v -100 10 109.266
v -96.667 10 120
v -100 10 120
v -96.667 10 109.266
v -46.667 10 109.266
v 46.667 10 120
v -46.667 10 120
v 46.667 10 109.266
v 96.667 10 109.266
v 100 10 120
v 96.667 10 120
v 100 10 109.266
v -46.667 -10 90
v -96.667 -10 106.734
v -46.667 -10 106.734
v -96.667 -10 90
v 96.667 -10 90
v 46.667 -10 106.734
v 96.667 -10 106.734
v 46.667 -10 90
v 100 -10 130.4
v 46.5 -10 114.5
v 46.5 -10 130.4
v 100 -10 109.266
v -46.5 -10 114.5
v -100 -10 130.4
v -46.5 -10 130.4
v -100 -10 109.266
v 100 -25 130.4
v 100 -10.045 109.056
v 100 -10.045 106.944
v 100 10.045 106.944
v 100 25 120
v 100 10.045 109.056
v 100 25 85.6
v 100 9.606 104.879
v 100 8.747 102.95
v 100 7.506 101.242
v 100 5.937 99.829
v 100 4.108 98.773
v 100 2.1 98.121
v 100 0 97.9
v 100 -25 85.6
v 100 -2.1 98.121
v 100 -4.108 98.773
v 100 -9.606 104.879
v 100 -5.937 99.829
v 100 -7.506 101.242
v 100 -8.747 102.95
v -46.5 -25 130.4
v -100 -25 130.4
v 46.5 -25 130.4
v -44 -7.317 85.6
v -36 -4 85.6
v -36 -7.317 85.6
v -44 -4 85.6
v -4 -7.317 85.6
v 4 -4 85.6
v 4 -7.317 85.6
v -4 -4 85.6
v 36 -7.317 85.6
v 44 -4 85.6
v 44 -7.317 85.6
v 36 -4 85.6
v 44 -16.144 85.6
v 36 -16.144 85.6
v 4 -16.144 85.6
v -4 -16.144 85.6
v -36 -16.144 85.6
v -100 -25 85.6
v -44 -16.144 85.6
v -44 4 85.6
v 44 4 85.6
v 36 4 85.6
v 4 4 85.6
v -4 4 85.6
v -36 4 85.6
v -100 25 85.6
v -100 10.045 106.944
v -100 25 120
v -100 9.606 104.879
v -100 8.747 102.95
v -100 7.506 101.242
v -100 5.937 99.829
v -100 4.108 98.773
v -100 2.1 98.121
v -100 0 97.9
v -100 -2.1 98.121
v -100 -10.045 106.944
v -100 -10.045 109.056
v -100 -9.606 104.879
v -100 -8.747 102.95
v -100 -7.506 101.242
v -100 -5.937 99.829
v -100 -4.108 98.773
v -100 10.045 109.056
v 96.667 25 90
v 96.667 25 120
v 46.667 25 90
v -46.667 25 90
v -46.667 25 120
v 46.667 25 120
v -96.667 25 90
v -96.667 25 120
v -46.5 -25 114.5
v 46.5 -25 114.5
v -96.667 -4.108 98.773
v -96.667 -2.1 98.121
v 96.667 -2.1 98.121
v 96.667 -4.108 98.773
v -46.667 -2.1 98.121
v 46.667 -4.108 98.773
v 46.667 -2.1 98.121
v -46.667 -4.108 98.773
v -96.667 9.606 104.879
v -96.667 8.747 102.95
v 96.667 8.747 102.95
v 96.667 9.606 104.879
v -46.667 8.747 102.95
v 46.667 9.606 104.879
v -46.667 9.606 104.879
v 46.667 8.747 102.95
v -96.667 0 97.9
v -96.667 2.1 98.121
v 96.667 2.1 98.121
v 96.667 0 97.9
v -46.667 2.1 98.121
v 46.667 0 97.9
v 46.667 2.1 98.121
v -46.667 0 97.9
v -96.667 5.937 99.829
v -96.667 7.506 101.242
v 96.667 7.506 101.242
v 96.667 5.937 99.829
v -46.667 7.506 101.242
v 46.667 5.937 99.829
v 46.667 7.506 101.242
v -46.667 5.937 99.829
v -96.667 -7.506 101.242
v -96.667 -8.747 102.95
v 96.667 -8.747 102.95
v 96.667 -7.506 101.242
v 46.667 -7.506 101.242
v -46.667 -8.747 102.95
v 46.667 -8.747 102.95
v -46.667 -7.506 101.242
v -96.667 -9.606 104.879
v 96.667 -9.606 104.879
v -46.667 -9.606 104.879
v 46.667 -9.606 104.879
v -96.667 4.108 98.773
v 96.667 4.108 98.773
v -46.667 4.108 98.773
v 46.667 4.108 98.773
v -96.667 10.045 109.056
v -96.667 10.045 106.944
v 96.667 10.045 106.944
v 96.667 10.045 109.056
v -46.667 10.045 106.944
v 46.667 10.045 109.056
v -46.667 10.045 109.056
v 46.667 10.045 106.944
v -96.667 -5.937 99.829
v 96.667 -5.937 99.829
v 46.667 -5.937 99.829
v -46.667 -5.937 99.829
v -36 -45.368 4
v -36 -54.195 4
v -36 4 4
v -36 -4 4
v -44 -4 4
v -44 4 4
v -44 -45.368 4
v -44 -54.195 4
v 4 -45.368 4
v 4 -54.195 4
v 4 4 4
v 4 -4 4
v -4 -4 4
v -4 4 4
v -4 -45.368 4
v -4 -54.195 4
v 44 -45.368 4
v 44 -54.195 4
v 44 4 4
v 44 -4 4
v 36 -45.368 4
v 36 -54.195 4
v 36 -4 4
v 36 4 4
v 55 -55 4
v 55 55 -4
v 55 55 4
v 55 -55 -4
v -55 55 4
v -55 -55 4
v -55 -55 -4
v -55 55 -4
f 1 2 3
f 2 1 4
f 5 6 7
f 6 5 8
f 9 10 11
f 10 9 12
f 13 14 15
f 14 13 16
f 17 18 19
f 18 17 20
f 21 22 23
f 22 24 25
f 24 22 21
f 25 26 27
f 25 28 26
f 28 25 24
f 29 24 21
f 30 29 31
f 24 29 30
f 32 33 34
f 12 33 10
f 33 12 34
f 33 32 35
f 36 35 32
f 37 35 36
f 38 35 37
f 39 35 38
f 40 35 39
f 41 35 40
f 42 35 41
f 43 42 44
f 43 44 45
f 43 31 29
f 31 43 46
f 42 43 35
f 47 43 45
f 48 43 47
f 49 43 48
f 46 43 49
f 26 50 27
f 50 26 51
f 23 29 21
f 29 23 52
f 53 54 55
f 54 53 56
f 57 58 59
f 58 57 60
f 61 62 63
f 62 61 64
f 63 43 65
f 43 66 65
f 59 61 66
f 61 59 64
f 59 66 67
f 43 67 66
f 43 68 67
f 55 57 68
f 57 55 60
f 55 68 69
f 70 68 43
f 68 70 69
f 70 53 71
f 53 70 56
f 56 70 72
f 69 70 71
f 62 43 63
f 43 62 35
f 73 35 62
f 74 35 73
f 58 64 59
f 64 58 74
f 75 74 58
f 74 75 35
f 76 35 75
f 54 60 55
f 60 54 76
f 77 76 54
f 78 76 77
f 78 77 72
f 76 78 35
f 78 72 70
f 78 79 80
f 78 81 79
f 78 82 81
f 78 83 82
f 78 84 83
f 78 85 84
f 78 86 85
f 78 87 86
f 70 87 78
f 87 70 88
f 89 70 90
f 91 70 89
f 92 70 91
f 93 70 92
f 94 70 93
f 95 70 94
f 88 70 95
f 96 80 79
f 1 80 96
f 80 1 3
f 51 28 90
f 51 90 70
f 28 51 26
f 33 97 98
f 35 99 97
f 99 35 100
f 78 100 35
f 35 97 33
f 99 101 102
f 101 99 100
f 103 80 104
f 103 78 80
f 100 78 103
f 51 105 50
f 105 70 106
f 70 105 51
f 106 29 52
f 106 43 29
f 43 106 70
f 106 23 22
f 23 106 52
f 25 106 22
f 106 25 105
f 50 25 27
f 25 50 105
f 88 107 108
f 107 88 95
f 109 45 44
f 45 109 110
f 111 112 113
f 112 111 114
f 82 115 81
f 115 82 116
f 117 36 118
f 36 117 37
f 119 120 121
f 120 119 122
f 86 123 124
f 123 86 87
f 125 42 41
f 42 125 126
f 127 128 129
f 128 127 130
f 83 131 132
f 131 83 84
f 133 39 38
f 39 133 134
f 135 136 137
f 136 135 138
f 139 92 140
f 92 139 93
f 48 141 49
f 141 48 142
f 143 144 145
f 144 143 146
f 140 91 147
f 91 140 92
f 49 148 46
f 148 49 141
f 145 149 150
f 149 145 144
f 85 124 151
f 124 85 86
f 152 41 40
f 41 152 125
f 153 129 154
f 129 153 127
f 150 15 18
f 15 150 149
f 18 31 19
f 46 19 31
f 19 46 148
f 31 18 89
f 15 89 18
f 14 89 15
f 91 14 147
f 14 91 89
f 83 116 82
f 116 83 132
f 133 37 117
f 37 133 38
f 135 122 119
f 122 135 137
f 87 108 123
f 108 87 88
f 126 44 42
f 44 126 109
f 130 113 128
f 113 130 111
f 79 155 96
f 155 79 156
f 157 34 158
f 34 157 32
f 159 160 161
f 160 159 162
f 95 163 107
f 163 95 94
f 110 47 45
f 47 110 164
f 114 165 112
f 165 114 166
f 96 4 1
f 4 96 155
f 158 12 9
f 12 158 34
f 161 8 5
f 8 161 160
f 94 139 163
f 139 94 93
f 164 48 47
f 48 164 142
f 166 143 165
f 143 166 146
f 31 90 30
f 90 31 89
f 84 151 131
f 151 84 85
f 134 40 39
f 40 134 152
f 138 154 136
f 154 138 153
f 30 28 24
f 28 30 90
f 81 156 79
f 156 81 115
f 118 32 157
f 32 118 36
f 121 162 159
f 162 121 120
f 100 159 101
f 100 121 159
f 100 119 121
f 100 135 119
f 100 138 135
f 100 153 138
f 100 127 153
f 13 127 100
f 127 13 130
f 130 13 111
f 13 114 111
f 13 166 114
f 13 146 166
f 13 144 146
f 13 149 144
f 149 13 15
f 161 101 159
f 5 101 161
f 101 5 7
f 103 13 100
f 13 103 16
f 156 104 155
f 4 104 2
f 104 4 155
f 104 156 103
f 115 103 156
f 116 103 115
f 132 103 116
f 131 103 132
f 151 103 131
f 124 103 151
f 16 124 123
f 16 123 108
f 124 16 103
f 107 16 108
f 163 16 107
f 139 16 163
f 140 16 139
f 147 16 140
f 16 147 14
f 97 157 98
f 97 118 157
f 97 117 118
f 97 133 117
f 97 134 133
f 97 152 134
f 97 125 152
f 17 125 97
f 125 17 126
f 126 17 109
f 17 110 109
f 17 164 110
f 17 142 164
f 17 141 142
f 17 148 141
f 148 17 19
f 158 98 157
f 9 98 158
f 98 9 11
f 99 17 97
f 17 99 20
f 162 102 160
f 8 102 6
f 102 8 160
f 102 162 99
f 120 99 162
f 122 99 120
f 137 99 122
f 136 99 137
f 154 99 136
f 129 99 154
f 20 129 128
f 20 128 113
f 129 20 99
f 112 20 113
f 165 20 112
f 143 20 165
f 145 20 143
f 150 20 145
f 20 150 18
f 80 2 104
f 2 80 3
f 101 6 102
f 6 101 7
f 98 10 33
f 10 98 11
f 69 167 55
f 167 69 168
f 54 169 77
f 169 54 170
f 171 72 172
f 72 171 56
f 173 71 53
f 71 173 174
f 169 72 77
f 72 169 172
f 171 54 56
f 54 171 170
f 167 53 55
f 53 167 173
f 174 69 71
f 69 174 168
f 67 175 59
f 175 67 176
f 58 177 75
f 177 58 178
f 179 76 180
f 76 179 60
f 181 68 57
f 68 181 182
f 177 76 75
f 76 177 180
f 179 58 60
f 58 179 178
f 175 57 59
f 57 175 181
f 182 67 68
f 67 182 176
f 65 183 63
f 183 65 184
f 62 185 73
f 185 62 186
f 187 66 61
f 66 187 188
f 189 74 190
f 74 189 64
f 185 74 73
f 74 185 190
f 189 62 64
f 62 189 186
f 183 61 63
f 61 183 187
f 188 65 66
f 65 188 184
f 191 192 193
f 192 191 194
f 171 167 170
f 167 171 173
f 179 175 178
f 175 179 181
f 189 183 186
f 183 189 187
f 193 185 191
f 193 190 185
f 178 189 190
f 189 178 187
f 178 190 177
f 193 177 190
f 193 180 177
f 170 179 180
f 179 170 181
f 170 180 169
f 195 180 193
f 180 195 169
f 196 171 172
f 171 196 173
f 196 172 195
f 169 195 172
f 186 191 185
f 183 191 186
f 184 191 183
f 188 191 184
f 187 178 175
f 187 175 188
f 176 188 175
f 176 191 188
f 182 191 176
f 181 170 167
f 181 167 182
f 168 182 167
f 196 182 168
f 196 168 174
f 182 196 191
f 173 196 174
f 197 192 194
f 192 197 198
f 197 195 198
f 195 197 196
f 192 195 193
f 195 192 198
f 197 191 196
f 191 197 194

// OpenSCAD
// file: clampipe.scad
   include <../robot_settings.scad>

module clam_pipe() {
      // clam pipe
       translate([0, 0, 0]) {
          rotate([0, 90, 0])
          cylinder(h = rail_width + 10, d = 19, center = true);
       }

       blade_length = 48;
       filling_length = 26;
      
      // clams
       translate([0, 13, 0])
       {
         // right upper clam blade -71.43 = 200 / 2.8 -> -76.43 /  200 = 1/2.62
        translate([-rail_width / 2.62,  15, rail_thickness])
        cube([rail_width / 5,  blade_length, rail_thickness], center = true);
         
         // right filling
         translate([-rail_width / 2.62, 2, -1])
         cube([rail_width / 5, filling_length, rail_thickness + 2], center = true);
         
         // right lower clam blade
        translate([-rail_width / 2.62,  15, -rail_thickness])
        cube([rail_width / 5,  blade_length, rail_thickness], center = true);
         
         // left filling
         translate([rail_width / 2.62, 2, -1])
         cube([rail_width / 5, filling_length, rail_thickness + 2], center = true);
         
        // left upper clam blade
        translate([rail_width / 2.62,  15, rail_thickness])
        cube([rail_width / 5,  blade_length, rail_thickness], center = true);
        
         // left lower clam blade
        translate([rail_width / 2.62,  15, -rail_thickness])
        cube([rail_width / 5,  blade_length, rail_thickness], center = true);
      }
    }
    clam_pipe();
// file: ../robot_settings.scad
main_box_x = 95; // 96
main_box_y = 102;
main_box_z = 74; // 74.5
wall_thickness = 2;

rail_gap = 2;
rail_inset = 7;

rail_thickness = 7;
rail_length = 250;
rail_width = 200;

raspberry_pi_screw_seperation_y = 57;
raspberry_pi_screw_seperation_z = 48;
raspberry_pi_peg_h = 5;

battery_box_peg_h = 6;
battery_box_peg_d = 8;
battery_box_peg_cutout = 5;

gears_module = 1;
pinion_gear_teeth = 32;
pinion_gear_width = 5;
pinion_gear_bore = 8;

gears_setback_distance = 25;
gear_post_height = 2 * pinion_gear_width + rail_thickness + 8 ;

steering_motor_mount_x = 45;
steering_motor_mount_y = 36;
steering_motor_mount_z = 18;
steering_motor_mount_setback_distance = gears_setback_distance + 16;

dc_motor_drivertype = "Teyleten"; // Teyleten
isAdafruit = (dc_motor_drivertype == "Adafruit");

drv8871_x = isAdafruit ? 20.3 : 21.6;
drv8871_y = isAdafruit ?  24 : 25;

drv8871_z = 2;
drv8871_screw_d = 2.5;
drv8871_solder_points_z = 2;

drv8871mount_edge_x = 1.5;
drv8871mount_edge_wall = 3;
drv8871mount_z = 5;
drv8871mount_x = drv8871_x +  drv8871mount_edge_wall - 2* drv8871mount_edge_x;
drv8871mount_y = 19;

drv8871_screw_distance = 15.64;
drv8871_solder_points_d = 1.66;
drv8871_solder_offset_y = 4.4;
drv8871_solder_inner_points_distance = 5;
drv8871_solder_outer_points_distance = 12;

dc_motor_housing_minus_encoder_z = 48;
dc_motor_encoder_z = 9.33;
dc_motor_encoder_wheel_d = 13.4;
dc_motor_encoder_wheel_thickness = 5;
dc_motor_encoder_wheel_gap = 3;
dc_motor_encoder_circuit_thickness = 2;
dc_motor_cutout_d = 24.8;
dc_motor_cutout_z = 19.5;

dc_motor_screw_head_z = 2;
dc_motor_screw_head_d = 5.6;
dc_motor_screw_d = 3.2;
dc_motor_screw_offset = 8.5;

dc_motor_axle_ring_z = 3;
dc_motor_axle_ring_d = 7.2;
dc_motor_axle_cutout_d = 4.5;
dc_motor_axle_cutout_z = 10;
dc_motor_axle_notch_cutout = 0.4;
dc_motor_axle_notch_cutout_z = 6;

pdmount_x = 20;
pdmount_y = 30;
pdmount_z = 2;
pdmount_edge_x = 1.5;
pdmount_edge_wall = 3;

steering_shaft_z = 45;
steering_shaft_d = 7;
steering_shaft_motor_fitting_d = 9;
coupler_length = 24.6;
coupler_diameter = 14;
coupler_screw_d = 4;
coupler_screw_z_offset = 5;
coupler_gear_side_insert = 12.6;
steering_shaft_with_coupler_z = steering_shaft_z - coupler_gear_side_insert;

lidar_mount_y = 110;
lidar_mount_x = 65 + 20;
lidar_narrow_screws = 40;
lidar_wide_screws = 56;
lidar_front_to_back_screws = 70;
lidar_screw_d = 3;
lidar_circuitboard_x = 20;
lidar_circuitboard_y = 35;
lidar_circuitboard_z = 1.2;
lidar_cord_length = 29;

ball_bearing_height = 7;
ball_bearing_outer_diameter = 22;
ball_bearing_inner_diameter = 8;

 armature_holder_height = 20;
 armature_holder_thickness = 8;
pull_bar_peg_r = 3.2;
apparatus_locking_peg_d = 4;

rack_module = 1;
rack_length = main_box_x / 2;
rack_height = 10;
rack_width = 10;
rack_teeth = 30;
rack_bore = 3;

pull_bar_length = rail_width / 2 - rack_length + 1;

// tire hardware
axle_length = 30;
axle_reciever_inner_diameter = 7.75;
axle_reciever_length = 18.8;
axle_notch_length = 7;
axle_notch_cutout = 2.4;

// power distribution bar
power_bar_cutout_x = 96;
power_bar_y = 19.1;
power_bar_z = 1.5;
power_bar_screw_distance = 91.4;
power_bar_screw_d = 2.8;
power_bar_standoff_z = 5;
power_bar_standoff_d = 6.83;

// breadboard
breadboard_wall_thickness = 3;
breadboard_width = 55;
breadboard_length = 83;
breadboard_height = 10.5;
breadboard_notch_width = 4.2;
breadboard_longside_notch_separation = 58.2 - breadboard_notch_width / 2;
breadboard_shortside_notch_separation = 26.3 - breadboard_notch_width;

pico_expander_width = 63;
pico_expander_height = 57;
pico_screw_hole_offset = 3;
pico_screw_hole_d = 2.5;

usbhub_thickness = 11.7;
usbhub_depth = 37.5;
usbhub_width = 86.7;
usbhub_end_port_width = 14.8;
usbhub_end_port_height = 12;
usbhub_front_face_safe_zone_left = 15;
usbhub_front_face_safe_zone_right = 14.8;

switch_w = 16;
switch_cutout_d = 12.2;
switch_bump_h = 2;
switch_bump_l = 18.2;
// main file
   include <../robot_settings.scad>
   use <clampipe.scad>
   
   // front end jack
  module back_jack(
    show_pipe = false,
    show_structure = true
    ) {
      
  if (show_structure == true) {
      // platform
      translate([0,  0, 0])
      cube([110, 110, 8], center = true);

     
      // top holder structure
      difference() {
          translate([0, 0, 108])
          cube([rail_width, 50, dc_motor_cutout_d + 20], center = true);
         
          // back wall breadboard clearance
          translate([0, -18, 123])
          cube([breadboard_length + 10, 20, 17], center = true);        
               
          // pipe carve out
          translate([0, 0, 108])
          rotate([0, 90, 0])
          cylinder(h = rail_width * 2, d = 20.2, center = true);

          // right turnbox carve out
          translate([-rail_width / 3 - 30, -10, 90])
          cube([rail_width / 4, 50,  dc_motor_cutout_d + 25]); 

          // right turnbox carve out
          translate([rail_width / 3 - 20, -10, 90])
          cube([rail_width / 4, 50,  dc_motor_cutout_d + 25]); 
    
        // flatten the top front holder structure to allow for more angles of freedom of the clam pipe
        translate([- rail_width / 2 - 1, 7, 120])
          cube([rail_width + 2, 20, 20]);
        
          // carve out the top so that the pipe can be added removed
          translate([0, 0, 108])
            difference() {
                translate([0, 0, 22])
                cube([rail_width+ 1, 20, dc_motor_cutout_d + 20], center = true);
            
              translate([0, 0, 0])
              rotate([0, 90, 0])
              cylinder(h = rail_width + 1.1, d = 20, center = true);
          }
    }


    difference() {
      
      union () {
         // left post
        translate([-40, 0, 54])
        cube([8,8,108], center = true);
        
        // left back support
        translate([-40,  -26, 55])
        rotate([-25, 0, 0])
        cube([8, 8, 120], center = true);
        
        // center post
        translate([0, 0, 108/2])
        cube([8,8, 108], center = true);
       
        // center back support 
        translate([0,  -26, 55])
        rotate([-25, 0, 0])
        cube([8, 8, 120], center = true);
        
        // center post
        translate([40, 0, 108/2])
        cube([8,8, 108], center = true);
       
        // center back support 
        translate([40,  -26, 55])
        rotate([-25, 0, 0])
        cube([8, 8, 120], center = true);
      }
     
      // carve out for clam pipe (otherwise the support columns get in the way
       translate([50, 0, 108])
        rotate([0, 90, 0])
        cylinder(h = 2 * rail_width, d =21, center = true);
    }
}


  if (show_pipe) {
      // clam pipe
       translate([0, 0, 108]) {
         rotate([33, 0, 0])
         clam_pipe();
       }
  }
}
back_jack();
